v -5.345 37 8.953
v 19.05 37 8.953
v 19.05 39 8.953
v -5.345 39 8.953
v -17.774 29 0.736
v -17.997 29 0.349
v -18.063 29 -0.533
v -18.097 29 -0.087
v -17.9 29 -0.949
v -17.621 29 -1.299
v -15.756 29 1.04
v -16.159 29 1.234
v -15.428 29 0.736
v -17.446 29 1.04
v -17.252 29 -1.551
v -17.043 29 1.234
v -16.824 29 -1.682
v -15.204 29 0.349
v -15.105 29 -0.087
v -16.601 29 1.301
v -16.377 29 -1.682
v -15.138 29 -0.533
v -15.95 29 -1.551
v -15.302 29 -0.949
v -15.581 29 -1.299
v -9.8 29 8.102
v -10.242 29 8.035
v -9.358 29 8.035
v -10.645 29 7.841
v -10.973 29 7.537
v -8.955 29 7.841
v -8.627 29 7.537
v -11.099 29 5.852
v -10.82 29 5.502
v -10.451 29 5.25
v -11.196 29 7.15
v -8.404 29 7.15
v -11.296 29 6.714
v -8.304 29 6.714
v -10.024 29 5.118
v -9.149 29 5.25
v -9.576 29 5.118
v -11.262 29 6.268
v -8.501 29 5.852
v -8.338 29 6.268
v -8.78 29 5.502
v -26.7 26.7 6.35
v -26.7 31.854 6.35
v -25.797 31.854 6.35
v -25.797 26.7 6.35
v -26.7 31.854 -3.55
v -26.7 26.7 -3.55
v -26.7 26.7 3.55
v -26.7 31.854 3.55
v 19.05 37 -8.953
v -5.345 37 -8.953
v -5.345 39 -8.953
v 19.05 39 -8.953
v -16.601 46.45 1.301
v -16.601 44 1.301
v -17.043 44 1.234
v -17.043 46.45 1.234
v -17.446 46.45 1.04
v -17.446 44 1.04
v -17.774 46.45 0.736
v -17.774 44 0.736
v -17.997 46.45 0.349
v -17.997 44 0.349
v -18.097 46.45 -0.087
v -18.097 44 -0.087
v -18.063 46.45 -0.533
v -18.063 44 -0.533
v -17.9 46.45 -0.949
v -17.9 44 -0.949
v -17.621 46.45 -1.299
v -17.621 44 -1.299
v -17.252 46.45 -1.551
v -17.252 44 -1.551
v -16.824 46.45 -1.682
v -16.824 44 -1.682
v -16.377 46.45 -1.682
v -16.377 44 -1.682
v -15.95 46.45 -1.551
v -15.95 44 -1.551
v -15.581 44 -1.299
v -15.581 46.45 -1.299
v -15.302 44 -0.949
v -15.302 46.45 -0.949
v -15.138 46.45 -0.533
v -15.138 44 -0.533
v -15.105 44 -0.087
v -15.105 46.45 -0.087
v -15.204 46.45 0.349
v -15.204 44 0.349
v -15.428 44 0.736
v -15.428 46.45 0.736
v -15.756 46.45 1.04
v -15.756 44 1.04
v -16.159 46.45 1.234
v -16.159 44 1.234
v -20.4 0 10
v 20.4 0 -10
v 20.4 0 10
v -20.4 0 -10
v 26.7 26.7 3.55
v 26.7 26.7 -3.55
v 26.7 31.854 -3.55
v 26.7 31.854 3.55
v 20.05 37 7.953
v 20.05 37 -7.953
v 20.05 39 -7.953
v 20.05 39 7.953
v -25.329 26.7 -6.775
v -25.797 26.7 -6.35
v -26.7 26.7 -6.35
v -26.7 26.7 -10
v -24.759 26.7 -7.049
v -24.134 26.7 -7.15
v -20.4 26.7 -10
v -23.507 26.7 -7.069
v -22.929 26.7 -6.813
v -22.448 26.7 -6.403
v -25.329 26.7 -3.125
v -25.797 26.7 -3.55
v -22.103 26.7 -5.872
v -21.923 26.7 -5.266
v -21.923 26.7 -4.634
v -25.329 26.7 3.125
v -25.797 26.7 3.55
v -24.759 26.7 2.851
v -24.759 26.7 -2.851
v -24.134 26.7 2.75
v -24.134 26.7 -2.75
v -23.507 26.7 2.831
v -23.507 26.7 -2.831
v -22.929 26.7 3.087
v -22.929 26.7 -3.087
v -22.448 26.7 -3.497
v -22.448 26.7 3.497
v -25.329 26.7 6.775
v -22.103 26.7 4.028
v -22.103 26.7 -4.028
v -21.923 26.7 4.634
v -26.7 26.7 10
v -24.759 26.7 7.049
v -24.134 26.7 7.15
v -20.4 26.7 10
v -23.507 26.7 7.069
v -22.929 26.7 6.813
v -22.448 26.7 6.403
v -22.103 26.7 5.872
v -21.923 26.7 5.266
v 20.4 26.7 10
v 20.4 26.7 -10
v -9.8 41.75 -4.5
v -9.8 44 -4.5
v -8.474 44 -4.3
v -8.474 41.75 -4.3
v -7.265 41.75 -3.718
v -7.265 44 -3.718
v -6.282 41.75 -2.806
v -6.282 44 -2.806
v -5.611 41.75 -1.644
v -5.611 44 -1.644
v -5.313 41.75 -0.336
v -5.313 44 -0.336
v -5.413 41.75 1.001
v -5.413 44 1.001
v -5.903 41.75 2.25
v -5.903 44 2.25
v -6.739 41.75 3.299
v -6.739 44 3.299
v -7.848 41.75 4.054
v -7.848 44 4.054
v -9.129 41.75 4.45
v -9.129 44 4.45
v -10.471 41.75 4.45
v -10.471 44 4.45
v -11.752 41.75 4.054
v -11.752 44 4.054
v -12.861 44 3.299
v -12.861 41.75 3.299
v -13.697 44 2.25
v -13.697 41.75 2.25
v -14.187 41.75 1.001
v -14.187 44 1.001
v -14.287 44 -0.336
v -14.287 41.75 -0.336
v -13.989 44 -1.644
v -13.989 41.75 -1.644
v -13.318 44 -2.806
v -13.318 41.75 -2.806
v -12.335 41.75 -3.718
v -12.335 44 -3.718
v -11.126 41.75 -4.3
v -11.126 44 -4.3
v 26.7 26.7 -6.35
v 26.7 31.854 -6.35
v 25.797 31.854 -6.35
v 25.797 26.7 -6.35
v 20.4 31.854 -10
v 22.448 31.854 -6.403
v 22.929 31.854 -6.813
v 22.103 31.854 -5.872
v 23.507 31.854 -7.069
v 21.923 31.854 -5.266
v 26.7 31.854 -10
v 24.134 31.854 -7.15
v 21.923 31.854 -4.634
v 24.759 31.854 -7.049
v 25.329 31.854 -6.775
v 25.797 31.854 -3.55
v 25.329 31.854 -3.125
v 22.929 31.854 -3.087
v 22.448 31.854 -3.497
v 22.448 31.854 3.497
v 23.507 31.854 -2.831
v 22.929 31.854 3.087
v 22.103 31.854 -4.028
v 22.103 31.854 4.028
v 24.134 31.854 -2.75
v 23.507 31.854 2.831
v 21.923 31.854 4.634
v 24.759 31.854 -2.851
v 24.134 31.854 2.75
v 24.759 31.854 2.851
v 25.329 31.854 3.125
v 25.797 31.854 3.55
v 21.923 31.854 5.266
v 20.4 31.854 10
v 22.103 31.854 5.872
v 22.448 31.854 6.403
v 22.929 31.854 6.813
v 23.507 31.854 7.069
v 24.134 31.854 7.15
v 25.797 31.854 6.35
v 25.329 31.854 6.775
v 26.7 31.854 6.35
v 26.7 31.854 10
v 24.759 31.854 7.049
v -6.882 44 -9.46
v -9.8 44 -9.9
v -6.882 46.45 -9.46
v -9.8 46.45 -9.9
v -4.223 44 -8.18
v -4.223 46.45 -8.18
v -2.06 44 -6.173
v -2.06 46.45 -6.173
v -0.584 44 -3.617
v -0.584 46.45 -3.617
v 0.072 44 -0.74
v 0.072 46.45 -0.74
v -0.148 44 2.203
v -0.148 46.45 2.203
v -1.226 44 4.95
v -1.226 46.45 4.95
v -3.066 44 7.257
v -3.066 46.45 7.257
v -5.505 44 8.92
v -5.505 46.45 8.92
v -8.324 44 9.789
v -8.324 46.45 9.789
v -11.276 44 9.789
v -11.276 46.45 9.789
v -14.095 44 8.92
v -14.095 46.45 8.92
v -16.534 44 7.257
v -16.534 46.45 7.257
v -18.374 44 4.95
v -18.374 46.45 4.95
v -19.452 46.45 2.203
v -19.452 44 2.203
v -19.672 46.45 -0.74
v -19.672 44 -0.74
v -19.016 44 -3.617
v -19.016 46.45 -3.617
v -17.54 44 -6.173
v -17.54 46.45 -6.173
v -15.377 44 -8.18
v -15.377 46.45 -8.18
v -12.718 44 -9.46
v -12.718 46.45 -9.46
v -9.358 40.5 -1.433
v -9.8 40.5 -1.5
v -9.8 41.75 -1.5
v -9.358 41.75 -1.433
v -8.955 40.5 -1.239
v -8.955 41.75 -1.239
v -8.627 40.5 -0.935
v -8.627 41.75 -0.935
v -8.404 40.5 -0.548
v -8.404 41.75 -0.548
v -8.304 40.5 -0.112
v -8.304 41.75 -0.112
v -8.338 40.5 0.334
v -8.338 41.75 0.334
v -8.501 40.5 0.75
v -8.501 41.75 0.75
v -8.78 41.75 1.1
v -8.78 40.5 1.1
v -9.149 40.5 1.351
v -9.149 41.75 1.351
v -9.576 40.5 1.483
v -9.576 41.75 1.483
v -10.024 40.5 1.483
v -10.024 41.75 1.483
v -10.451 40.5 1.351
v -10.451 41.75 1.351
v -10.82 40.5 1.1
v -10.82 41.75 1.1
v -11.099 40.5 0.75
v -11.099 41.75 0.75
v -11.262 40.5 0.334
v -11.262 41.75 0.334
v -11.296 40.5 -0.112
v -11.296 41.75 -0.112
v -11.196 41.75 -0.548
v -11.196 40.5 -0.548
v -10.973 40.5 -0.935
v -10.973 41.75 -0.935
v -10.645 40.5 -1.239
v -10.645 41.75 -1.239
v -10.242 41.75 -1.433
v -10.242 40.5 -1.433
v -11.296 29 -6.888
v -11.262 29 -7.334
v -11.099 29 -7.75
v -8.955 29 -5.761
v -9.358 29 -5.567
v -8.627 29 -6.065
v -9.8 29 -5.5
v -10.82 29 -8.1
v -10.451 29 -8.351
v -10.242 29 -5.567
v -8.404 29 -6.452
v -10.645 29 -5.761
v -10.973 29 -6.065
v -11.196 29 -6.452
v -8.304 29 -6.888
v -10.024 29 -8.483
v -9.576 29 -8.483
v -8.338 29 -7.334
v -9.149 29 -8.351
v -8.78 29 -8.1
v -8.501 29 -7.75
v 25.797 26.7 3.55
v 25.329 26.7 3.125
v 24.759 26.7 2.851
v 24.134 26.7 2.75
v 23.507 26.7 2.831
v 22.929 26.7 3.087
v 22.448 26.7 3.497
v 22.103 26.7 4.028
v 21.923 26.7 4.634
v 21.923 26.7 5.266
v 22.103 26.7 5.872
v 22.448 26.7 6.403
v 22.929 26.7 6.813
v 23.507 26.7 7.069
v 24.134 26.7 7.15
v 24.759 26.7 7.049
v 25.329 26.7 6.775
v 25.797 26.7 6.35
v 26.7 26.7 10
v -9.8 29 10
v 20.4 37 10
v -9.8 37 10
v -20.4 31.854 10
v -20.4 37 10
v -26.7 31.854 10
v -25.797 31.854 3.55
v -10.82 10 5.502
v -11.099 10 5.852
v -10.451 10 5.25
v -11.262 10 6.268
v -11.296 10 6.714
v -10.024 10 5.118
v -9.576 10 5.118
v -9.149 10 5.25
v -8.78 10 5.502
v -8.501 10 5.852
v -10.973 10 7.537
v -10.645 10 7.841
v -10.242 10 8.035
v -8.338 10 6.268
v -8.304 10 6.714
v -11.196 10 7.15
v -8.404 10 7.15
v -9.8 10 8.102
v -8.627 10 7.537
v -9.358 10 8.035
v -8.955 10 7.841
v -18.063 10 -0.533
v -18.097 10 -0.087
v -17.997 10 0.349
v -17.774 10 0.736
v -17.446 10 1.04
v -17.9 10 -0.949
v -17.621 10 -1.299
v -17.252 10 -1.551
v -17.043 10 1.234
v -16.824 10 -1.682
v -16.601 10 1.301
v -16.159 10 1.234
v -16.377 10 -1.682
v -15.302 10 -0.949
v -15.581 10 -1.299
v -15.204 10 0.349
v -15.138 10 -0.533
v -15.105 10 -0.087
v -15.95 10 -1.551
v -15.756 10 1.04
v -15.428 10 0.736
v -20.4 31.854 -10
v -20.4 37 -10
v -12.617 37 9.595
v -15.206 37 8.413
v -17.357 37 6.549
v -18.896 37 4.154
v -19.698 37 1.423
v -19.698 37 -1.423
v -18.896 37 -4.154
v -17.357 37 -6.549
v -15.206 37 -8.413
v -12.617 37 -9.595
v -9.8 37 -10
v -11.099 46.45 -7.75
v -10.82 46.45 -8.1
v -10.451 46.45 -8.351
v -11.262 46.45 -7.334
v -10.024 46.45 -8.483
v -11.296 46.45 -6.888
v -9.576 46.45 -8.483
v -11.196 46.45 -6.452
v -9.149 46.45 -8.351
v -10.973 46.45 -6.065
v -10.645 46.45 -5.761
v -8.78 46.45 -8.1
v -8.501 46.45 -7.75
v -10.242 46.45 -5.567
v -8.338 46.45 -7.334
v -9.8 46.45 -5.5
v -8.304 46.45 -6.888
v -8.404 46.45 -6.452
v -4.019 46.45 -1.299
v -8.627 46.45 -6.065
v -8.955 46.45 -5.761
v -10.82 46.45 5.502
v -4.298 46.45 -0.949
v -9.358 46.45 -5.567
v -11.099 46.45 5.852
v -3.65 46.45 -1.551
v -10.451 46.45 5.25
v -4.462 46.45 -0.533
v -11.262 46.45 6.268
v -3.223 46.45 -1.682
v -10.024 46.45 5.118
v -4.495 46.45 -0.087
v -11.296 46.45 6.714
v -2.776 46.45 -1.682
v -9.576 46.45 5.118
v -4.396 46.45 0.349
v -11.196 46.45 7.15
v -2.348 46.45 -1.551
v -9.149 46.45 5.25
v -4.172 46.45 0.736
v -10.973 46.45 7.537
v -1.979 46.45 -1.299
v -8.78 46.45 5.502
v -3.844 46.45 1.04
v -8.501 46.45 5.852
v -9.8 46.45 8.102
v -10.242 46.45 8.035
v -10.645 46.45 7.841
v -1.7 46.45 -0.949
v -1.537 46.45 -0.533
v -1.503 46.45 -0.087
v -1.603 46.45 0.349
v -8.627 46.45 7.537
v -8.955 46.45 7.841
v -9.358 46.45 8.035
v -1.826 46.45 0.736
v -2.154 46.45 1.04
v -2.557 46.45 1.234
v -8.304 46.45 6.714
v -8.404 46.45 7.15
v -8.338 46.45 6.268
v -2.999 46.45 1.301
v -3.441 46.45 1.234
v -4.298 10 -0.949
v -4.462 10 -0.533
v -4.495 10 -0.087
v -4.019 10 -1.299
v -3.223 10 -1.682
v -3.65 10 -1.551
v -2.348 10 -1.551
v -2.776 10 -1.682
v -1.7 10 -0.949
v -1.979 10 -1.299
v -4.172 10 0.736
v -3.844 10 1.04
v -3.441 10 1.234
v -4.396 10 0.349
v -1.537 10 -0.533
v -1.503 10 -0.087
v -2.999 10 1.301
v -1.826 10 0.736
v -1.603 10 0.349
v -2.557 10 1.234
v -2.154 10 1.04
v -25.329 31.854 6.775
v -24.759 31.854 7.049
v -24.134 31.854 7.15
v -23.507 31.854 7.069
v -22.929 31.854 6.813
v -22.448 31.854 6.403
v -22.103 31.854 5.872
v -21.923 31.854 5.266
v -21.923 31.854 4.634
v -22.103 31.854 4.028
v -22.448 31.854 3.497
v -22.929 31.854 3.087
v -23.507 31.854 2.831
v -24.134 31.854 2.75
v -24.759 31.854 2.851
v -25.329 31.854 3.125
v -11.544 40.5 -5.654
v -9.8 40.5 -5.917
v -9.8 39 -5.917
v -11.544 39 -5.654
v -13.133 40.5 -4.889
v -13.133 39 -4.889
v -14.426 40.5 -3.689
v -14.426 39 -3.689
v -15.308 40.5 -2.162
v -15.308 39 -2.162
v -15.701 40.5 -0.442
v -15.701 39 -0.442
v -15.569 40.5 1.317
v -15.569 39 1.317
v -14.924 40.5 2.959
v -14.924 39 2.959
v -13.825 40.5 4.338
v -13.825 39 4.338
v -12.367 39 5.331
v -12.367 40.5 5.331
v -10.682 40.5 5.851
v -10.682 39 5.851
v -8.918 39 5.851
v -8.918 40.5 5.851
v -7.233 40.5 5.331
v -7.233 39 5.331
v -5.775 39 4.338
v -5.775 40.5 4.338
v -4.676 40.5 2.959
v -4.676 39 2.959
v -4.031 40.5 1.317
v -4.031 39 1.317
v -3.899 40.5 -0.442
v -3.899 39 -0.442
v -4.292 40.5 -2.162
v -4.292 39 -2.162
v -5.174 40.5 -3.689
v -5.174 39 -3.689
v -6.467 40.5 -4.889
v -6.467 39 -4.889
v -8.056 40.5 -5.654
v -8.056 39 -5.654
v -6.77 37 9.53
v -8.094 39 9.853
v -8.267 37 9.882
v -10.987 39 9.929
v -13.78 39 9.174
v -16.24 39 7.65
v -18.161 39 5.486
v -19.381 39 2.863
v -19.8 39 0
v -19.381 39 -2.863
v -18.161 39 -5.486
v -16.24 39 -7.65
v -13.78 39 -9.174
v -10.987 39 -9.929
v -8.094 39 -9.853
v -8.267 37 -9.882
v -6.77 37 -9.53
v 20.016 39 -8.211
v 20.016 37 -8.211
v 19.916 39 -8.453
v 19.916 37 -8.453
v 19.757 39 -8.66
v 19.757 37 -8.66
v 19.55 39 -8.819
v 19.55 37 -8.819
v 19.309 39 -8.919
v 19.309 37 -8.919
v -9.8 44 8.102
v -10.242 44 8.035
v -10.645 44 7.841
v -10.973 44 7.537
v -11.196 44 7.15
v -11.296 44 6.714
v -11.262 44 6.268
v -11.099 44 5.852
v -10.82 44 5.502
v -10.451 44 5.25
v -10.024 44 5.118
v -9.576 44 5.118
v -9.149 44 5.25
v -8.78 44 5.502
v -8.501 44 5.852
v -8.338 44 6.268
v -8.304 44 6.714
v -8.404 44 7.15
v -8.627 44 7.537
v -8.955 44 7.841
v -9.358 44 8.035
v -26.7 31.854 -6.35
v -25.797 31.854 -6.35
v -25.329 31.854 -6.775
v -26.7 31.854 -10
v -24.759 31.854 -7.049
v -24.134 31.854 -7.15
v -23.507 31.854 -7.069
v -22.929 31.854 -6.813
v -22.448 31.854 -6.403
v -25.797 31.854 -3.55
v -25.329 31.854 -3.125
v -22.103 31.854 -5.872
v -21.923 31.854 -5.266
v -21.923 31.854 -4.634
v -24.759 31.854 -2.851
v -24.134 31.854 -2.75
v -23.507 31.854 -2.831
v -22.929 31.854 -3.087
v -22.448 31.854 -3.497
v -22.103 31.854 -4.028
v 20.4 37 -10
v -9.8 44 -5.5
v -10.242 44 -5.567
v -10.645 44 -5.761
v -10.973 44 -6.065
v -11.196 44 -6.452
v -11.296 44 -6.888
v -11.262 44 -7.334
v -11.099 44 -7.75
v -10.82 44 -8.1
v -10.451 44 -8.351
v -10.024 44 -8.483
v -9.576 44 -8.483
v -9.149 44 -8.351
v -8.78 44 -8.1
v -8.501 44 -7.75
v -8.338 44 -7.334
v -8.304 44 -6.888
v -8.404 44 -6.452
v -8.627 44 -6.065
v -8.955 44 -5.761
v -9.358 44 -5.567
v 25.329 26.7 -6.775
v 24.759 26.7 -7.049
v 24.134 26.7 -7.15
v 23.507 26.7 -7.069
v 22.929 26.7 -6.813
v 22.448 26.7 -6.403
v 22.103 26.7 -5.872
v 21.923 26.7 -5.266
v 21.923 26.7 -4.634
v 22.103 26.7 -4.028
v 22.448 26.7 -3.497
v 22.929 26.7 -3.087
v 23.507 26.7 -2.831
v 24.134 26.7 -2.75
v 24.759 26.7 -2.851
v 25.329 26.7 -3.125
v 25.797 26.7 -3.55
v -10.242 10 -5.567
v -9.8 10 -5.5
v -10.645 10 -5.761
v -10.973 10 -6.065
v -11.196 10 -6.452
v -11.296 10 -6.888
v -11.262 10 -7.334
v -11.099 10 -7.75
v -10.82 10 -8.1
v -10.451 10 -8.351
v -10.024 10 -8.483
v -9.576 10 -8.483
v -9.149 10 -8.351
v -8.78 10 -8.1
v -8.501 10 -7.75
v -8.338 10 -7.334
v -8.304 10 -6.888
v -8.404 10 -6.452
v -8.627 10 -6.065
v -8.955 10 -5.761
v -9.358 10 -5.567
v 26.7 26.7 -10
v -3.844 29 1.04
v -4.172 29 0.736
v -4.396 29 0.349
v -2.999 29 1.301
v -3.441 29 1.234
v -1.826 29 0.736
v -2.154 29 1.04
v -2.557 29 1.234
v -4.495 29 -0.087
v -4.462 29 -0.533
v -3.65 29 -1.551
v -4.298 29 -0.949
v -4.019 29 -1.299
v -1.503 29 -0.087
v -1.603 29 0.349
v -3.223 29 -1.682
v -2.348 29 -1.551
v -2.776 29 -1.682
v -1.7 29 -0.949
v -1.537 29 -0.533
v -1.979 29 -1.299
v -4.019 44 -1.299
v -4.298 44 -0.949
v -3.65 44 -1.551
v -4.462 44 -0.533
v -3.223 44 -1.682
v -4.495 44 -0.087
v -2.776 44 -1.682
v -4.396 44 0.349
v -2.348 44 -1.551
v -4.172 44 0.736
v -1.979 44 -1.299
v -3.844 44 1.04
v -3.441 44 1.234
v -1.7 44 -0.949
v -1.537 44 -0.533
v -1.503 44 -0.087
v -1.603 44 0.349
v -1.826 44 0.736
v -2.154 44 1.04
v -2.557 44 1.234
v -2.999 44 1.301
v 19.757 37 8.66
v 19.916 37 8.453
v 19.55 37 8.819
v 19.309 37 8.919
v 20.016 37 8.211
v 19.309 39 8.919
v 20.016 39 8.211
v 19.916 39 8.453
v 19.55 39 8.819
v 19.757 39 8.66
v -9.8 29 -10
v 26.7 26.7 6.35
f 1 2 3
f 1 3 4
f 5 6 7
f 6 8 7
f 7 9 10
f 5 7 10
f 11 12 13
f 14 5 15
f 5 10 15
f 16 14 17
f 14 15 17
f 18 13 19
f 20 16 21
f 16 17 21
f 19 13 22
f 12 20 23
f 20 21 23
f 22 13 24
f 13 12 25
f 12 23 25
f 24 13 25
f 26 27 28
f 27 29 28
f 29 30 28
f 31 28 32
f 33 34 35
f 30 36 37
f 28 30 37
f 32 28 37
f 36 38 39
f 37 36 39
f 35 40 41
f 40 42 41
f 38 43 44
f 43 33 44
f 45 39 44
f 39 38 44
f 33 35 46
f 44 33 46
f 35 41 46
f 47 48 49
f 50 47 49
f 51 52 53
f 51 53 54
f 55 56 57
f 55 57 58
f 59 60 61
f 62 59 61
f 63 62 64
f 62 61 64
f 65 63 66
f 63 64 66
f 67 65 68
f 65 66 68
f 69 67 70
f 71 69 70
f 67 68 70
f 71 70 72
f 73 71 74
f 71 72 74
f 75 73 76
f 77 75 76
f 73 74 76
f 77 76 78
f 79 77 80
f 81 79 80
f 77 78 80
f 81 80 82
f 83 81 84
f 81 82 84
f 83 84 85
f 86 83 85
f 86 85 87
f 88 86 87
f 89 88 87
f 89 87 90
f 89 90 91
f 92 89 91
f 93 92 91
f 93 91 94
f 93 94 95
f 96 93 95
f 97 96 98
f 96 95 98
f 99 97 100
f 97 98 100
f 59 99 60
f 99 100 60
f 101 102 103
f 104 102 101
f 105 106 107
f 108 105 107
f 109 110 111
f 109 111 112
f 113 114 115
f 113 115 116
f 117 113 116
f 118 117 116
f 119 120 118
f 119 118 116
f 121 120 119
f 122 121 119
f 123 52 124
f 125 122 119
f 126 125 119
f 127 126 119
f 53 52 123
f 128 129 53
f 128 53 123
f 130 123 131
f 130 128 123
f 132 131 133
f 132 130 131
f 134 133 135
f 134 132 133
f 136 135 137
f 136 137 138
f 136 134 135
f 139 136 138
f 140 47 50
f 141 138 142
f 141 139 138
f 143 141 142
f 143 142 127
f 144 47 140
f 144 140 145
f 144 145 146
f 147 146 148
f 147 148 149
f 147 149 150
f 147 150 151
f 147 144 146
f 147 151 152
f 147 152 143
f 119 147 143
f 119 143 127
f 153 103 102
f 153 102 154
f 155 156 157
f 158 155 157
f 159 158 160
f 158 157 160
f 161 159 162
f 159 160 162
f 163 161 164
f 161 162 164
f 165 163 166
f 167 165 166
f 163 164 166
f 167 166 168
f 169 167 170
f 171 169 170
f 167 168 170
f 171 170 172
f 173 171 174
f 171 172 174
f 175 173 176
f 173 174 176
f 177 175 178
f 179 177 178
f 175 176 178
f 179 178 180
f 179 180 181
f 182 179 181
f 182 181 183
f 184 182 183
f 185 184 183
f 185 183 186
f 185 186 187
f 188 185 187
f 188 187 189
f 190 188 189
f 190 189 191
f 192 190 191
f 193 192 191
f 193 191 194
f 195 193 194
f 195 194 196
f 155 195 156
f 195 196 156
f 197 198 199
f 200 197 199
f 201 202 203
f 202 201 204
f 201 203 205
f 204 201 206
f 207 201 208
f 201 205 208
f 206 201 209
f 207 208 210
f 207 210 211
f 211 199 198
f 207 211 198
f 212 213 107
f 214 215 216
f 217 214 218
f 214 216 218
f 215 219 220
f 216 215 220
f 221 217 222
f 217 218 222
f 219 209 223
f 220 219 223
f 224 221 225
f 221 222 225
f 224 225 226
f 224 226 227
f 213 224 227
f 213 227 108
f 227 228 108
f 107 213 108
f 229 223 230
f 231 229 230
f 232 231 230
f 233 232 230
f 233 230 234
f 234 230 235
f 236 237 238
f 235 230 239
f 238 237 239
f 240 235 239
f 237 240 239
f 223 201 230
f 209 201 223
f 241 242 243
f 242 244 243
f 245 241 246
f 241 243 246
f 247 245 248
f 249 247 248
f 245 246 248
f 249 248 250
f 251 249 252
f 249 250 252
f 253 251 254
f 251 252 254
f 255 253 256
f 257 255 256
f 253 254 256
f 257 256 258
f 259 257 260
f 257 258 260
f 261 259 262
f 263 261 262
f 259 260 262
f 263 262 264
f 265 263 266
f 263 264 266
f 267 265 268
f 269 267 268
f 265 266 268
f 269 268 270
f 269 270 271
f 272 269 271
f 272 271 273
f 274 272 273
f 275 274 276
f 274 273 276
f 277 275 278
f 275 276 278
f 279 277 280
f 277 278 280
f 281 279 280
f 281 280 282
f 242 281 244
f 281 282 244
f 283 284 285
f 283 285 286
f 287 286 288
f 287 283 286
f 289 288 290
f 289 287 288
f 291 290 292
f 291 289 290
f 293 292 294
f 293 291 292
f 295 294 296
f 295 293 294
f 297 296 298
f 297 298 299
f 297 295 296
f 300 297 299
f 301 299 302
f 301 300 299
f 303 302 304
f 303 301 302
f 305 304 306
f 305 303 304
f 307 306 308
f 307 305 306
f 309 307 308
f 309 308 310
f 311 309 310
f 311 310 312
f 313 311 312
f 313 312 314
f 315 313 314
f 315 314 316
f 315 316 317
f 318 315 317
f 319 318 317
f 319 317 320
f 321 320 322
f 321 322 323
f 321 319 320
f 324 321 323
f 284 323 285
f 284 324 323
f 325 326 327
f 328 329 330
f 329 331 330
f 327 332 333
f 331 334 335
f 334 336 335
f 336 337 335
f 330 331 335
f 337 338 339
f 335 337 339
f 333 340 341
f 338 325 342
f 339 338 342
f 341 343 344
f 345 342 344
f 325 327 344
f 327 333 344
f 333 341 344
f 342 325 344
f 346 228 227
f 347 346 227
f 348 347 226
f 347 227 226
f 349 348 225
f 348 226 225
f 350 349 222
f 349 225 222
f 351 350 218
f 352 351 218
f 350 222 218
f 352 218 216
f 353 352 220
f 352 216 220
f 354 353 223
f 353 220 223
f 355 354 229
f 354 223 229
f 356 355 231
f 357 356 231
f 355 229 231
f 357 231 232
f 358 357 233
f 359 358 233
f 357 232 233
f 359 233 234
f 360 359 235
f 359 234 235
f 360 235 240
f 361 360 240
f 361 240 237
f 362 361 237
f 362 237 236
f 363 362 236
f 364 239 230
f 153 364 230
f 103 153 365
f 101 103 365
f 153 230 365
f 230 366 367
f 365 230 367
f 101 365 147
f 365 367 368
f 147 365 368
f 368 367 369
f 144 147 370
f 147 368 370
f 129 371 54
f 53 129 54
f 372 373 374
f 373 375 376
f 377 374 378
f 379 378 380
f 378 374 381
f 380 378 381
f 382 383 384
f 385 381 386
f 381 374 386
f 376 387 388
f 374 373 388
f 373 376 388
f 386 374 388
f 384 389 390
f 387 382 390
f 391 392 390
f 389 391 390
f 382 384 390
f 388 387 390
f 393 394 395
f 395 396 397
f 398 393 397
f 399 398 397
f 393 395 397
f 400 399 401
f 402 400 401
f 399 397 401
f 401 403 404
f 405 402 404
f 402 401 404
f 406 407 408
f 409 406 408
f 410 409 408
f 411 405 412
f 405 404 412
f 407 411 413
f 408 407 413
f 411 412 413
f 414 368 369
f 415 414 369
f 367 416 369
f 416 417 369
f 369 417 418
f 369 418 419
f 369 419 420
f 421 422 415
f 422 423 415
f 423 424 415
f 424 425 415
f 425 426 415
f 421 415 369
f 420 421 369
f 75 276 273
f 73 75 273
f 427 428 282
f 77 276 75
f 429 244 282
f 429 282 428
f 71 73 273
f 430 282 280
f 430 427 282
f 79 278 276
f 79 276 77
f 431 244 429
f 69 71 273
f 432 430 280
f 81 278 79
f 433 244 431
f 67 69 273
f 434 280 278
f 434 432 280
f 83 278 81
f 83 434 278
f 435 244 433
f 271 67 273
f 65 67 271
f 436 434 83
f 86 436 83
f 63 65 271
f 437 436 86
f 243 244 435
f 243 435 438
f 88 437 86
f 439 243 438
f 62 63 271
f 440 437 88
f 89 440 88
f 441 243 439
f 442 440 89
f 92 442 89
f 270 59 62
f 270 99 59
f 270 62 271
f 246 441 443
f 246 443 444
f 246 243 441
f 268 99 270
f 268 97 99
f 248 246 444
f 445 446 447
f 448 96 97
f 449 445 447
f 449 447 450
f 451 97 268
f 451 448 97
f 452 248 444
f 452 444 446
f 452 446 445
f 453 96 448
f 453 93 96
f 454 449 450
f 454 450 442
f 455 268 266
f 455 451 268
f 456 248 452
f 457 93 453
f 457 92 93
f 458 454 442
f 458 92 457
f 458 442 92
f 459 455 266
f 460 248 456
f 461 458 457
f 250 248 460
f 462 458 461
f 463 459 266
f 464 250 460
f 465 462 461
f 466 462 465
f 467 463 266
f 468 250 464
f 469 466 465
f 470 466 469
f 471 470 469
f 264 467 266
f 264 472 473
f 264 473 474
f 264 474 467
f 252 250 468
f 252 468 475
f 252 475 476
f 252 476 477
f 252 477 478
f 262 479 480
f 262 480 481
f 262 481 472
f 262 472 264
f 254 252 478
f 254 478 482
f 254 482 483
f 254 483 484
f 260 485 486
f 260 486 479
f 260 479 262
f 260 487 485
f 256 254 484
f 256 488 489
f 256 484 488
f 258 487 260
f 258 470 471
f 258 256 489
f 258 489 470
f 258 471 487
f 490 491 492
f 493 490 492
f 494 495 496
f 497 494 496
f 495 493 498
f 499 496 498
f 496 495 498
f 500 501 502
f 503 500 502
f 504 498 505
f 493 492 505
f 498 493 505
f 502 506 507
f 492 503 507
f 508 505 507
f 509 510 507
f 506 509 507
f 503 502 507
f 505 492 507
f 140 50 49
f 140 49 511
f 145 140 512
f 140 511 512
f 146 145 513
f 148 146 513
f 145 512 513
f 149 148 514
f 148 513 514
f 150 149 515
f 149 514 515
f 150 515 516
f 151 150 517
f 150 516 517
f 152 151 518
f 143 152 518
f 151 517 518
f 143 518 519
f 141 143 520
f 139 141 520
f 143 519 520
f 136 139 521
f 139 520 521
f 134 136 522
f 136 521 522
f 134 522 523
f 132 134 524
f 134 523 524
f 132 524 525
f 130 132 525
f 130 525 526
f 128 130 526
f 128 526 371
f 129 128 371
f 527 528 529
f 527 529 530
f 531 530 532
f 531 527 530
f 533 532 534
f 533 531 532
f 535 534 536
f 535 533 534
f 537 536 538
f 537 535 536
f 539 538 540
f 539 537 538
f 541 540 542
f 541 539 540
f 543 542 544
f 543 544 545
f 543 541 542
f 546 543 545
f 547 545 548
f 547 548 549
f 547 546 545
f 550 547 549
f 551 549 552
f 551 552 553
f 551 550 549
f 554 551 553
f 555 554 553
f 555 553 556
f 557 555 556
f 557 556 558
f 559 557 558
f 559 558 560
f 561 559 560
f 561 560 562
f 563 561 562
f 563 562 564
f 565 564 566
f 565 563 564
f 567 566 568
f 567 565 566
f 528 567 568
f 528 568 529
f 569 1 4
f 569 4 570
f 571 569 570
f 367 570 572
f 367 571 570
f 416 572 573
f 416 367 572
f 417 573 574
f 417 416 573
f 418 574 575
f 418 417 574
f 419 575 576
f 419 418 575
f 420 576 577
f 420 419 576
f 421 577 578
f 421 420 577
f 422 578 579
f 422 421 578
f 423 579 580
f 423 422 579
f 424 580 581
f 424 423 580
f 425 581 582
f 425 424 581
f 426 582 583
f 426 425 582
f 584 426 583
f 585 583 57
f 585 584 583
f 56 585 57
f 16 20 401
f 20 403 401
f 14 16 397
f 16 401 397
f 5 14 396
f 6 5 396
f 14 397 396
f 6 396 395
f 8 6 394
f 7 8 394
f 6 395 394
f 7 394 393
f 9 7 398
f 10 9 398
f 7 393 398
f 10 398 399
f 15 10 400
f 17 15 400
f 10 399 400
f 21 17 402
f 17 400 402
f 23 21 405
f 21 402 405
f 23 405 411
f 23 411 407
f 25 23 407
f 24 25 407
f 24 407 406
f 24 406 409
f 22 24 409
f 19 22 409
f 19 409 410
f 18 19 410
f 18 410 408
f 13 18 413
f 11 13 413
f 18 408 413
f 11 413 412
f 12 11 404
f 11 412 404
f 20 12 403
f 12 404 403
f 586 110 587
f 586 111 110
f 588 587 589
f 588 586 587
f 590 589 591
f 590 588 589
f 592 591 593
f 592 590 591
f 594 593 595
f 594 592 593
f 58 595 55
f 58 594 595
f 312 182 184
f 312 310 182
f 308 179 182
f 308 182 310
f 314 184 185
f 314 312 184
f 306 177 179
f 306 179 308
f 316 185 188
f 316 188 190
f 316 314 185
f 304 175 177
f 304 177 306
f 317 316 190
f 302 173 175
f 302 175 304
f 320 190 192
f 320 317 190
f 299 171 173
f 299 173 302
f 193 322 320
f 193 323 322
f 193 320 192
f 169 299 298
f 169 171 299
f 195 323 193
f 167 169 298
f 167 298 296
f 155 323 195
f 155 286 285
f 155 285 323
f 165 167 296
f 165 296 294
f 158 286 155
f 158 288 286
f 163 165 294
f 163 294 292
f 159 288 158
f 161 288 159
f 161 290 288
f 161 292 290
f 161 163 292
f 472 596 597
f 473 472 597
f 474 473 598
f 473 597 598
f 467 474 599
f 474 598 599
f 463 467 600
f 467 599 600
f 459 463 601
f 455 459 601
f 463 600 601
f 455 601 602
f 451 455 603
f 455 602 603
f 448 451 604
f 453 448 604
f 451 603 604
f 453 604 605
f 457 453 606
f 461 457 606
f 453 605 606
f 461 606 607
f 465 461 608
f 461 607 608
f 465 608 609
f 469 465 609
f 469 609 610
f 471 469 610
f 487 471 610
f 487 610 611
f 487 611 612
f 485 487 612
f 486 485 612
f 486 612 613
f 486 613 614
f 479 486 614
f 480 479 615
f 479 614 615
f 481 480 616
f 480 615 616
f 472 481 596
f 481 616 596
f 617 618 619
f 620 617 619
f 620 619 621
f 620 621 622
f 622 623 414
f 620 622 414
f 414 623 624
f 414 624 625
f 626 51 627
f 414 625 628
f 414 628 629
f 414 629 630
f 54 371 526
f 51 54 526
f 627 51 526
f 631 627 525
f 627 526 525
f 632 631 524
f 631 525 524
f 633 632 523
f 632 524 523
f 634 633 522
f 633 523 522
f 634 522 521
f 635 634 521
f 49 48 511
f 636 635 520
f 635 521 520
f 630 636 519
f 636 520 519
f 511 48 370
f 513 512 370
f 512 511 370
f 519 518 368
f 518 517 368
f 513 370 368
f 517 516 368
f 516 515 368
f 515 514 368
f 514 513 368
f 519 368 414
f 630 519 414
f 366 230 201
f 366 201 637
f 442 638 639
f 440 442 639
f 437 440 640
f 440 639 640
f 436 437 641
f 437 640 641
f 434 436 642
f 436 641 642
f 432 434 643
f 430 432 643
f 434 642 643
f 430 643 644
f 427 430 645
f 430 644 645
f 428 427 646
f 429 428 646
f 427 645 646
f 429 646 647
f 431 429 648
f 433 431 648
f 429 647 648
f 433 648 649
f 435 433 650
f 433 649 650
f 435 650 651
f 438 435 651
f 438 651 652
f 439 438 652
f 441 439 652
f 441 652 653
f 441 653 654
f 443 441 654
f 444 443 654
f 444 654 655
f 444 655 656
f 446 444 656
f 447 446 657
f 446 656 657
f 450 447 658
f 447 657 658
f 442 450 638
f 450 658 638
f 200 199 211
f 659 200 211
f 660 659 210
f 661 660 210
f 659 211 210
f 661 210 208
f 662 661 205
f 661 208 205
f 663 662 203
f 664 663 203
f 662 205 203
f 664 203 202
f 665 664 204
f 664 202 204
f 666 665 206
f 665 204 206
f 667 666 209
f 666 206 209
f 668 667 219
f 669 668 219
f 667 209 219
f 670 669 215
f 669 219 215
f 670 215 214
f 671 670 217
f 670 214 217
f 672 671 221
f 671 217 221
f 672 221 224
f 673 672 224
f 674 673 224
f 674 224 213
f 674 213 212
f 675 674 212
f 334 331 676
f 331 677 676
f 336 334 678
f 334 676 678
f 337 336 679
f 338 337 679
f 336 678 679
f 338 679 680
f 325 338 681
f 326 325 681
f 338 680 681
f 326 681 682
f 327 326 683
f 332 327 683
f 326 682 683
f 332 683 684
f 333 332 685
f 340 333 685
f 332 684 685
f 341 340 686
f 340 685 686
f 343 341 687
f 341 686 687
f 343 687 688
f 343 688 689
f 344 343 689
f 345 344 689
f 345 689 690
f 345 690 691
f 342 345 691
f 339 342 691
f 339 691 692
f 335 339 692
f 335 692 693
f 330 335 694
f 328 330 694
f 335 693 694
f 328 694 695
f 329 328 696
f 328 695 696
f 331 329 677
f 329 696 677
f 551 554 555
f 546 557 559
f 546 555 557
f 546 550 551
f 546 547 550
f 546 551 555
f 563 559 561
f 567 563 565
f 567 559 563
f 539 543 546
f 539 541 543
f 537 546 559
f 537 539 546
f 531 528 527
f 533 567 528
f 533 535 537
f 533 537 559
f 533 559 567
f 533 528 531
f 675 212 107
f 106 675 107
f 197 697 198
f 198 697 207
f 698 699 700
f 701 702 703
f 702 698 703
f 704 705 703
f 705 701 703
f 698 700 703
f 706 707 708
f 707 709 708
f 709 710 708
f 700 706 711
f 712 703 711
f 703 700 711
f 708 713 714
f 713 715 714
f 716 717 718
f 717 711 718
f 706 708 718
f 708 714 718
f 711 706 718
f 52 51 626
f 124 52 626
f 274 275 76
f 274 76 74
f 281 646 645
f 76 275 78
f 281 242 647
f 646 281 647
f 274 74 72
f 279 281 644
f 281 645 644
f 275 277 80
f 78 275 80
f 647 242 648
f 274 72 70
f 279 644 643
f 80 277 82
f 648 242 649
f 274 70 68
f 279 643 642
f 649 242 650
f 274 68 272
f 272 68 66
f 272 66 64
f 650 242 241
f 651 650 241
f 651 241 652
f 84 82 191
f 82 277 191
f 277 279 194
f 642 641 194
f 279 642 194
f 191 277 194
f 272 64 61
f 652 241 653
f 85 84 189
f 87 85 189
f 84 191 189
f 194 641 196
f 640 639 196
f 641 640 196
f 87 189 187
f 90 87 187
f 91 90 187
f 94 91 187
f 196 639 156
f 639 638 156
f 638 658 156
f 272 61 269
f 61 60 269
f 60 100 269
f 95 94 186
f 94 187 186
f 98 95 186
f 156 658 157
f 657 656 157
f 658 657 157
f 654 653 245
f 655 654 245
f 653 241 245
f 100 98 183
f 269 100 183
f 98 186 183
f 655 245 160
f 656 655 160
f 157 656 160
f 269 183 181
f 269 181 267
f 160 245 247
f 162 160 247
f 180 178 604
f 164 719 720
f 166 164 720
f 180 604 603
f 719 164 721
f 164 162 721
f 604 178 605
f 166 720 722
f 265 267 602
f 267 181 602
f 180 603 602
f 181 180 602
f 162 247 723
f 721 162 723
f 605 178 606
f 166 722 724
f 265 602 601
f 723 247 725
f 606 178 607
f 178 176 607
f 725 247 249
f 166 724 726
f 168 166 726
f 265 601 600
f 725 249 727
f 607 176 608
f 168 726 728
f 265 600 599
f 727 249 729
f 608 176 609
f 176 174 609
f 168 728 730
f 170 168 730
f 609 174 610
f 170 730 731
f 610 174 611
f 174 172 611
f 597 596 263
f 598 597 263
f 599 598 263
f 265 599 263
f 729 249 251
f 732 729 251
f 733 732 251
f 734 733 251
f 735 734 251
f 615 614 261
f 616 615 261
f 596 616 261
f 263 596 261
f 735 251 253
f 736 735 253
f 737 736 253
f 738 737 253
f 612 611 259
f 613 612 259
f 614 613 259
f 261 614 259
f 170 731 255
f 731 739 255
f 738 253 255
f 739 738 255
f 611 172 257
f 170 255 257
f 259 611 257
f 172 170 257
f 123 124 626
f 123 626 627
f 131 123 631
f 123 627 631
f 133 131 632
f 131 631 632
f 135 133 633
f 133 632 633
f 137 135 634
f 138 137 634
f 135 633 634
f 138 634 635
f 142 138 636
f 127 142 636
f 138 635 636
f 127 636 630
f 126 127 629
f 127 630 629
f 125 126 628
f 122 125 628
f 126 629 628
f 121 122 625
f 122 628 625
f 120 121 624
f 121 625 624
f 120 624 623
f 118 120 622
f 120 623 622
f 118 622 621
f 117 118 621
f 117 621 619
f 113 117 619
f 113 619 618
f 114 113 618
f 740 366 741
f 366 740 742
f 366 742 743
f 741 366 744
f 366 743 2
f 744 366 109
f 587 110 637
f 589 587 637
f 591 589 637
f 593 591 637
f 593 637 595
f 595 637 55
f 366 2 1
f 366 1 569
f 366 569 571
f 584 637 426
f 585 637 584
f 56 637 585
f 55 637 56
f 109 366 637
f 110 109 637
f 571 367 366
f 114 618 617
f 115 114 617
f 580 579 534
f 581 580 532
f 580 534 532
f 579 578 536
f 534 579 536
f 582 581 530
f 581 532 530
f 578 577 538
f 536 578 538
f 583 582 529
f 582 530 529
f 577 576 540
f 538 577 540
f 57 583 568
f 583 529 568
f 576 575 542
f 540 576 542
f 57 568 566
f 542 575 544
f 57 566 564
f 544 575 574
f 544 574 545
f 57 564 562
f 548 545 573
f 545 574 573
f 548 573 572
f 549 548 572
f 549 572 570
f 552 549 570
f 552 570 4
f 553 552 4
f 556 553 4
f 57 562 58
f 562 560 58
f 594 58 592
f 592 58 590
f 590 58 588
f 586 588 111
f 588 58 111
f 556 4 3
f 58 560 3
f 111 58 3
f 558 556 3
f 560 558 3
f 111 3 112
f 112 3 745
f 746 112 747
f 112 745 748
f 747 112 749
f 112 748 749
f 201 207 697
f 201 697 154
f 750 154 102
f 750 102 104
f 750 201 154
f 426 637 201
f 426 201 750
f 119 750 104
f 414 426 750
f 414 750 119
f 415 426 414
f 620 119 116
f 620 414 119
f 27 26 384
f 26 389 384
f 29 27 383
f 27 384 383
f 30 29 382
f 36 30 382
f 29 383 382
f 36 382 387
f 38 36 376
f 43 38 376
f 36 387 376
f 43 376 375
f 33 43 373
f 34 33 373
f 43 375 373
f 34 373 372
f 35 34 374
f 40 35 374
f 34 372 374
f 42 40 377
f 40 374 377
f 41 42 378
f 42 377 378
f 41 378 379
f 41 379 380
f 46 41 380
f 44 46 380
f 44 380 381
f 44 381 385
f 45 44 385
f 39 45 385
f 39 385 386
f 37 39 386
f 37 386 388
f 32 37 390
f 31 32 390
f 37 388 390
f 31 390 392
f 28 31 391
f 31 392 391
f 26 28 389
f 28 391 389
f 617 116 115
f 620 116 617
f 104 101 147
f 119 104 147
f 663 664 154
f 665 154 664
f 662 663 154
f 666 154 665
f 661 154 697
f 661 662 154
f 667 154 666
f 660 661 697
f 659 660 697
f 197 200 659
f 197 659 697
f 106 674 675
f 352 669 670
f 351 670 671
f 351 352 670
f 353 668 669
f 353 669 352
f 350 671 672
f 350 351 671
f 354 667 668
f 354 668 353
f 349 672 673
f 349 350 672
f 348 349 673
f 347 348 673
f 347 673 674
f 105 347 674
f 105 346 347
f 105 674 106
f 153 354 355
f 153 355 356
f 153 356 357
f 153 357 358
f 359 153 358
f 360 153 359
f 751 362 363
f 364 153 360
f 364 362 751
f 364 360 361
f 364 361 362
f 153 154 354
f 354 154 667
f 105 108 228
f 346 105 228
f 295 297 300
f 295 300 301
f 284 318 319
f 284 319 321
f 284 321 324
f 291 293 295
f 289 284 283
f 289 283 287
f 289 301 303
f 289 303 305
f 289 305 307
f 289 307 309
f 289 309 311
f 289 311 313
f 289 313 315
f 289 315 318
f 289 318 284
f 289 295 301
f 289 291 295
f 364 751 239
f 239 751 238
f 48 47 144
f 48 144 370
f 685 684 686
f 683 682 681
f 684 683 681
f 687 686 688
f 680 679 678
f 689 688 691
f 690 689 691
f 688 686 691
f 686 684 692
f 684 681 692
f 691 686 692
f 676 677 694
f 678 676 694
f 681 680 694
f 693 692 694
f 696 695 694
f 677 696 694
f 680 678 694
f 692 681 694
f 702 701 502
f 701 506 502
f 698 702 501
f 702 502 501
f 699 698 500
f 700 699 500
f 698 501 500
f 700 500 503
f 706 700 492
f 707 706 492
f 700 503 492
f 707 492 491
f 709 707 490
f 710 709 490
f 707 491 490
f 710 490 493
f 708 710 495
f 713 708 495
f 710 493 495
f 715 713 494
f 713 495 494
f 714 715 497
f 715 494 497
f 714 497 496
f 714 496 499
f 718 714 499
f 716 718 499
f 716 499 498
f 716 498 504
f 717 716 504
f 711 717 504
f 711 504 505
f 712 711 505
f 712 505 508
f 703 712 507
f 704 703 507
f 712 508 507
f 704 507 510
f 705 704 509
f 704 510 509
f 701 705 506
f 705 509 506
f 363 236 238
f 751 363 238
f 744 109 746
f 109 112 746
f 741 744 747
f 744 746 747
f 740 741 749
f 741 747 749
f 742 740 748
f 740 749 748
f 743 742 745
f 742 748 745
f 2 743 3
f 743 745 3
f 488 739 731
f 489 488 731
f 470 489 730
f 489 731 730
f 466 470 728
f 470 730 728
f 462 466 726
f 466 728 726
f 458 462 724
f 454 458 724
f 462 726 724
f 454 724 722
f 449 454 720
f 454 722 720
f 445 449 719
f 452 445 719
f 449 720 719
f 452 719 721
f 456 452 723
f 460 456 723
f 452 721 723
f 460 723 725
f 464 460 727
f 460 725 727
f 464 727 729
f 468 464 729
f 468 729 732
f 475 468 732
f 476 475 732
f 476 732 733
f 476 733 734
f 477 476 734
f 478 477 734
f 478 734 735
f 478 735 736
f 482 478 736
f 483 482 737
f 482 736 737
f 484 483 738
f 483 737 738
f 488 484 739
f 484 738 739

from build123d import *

# Parameters (mm, degrees)
SKETCH9_W                         = 53.4
SKETCH9_H                         = 37
BOSS_EXTRUDE3_DEPTH               = 20
BOSS_EXTRUDE4_DEPTH               = 2
SKETCH15_W                        = 6.3
SKETCH15_H                        = 26.7
CUT_EXTRUDE1_DEPTH                = 52.321438016
SKETCH16_W                        = 6.3
SKETCH16_H                        = 5.145561791
CUT_EXTRUDE2_DEPTH                = 52.321438016
SKETCH17_W                        = 6.3
SKETCH17_H                        = 5.145561791
CUT_EXTRUDE3_DEPTH                = 52.321438016
CUT_EXTRUDE4_DEPTH                = 43.750382848
CUT_EXTRUDE5_DEPTH                = 43.750382848
SKETCH30_W                        = 6.3
SKETCH30_H                        = 26.7
CUT_EXTRUDE6_DEPTH                = 52.321438016
CUT_EXTRUDE7_DEPTH                = 43.750382848
CUT_EXTRUDE8_DEPTH                = 43.750382848
SKETCH40_W                        = 5.917139292
SKETCH40_H                        = 1.5
SKETCH47_W                        = 2.2
SKETCH47_H                        = 5.154438209
SKETCH55_W                        = 2.2
SKETCH55_H                        = 5.154438209
SKETCH64_W                        = 2.2
SKETCH64_H                        = 5.154438209
SKETCH72_W                        = 2.2
SKETCH72_H                        = 5.154438209
F_3_0_3_DIAMETER_HOLE2_D          = 3
F_3_0_3_DIAMETER_HOLE2_DEPTH      = 1.5
FILLET1_R                         = 1
SKETCH76_W                        = 9.9
SKETCH76_H                        = 2.45
SKETCH85_R                        = 4.5
BOSS_EXTRUDE5_DEPTH               = 2.25
BOSS_EXTRUDE6_START               = 1.25
SKETCH86_R                        = 1.5
BOSS_EXTRUDE6_DEPTH               = 1.25
SKETCH87_W                        = 1.5
SKETCH87_H                        = 46.45
F_3_0_3_DIAMETER_HOLE3_AT_2_COUNT = 2
F_3_0_3_DIAMETER_HOLE3_AT_2_PITCH = 9.617734802
F_3_0_3_DIAMETER_HOLE3_AT_3_COUNT = 2
F_3_0_3_DIAMETER_HOLE3_AT_3_PITCH = 13.601530997
F_3_0_3_DIAMETER_HOLE3_AT_4_COUNT = 2
F_3_0_3_DIAMETER_HOLE3_AT_4_PITCH = 9.617734802
SKETCH89_W                        = 40.8
SKETCH89_H                        = 20
BOSS_EXTRUDE7_DEPTH               = 10
BOSS_EXTRUDE8_DEPTH               = 10
SKETCH91_R                        = 5.917139292
BOSS_EXTRUDE9_DEPTH               = 10


with BuildPart() as part:
    # Sketch9 → Boss-Extrude3 (new body)
    with BuildSketch(Plane(origin=(0, 0, -10), x_dir=(-1, 0, 0), z_dir=(0, 0, -1))):
        with Locations((0, 18.5)):
            Rectangle(SKETCH9_W, SKETCH9_H)
    extrude(amount=-BOSS_EXTRUDE3_DEPTH)

    # Sketch10 → Boss-Extrude4 (add)
    with BuildSketch(Plane(origin=(0, 37, 0), x_dir=(-1, 0, 0), z_dir=(0, 1, 0))):
        with BuildLine():
            Line((-20.05, -8.952596504), (-20.05, 8.952596504))
            Line((-20.05, 8.952596504), (5.344552118, 8.952596504))
            ThreePointArc((5.344552118, 8.952596504), (19.8, 0), (5.344552118, -8.952596504))
            Line((5.344552118, -8.952596504), (-20.05, -8.952596504))
        make_face()
    extrude(amount=BOSS_EXTRUDE4_DEPTH)

    # Sketch15 → Cut-Extrude1 (cut, through all)
    with BuildSketch(Plane.XY.offset(10)):
        with Locations((-23.55, 13.35)):
            Rectangle(SKETCH15_W, SKETCH15_H)
    extrude(amount=-CUT_EXTRUDE1_DEPTH, mode=Mode.SUBTRACT)

    # Sketch16 → Cut-Extrude2 (cut, through all)
    with BuildSketch(Plane.XY.offset(10)):
        with Locations((-23.55, 34.427219104)):
            Rectangle(SKETCH16_W, SKETCH16_H)
    extrude(amount=-CUT_EXTRUDE2_DEPTH, mode=Mode.SUBTRACT)

    # Sketch17 → Cut-Extrude3 (cut, through all)
    with BuildSketch(Plane.XY.offset(10)):
        with Locations((23.55, 34.427219104)):
            Rectangle(SKETCH17_W, SKETCH17_H)
    extrude(amount=-CUT_EXTRUDE3_DEPTH, mode=Mode.SUBTRACT)

    # Sketch23 → Cut-Extrude4 (cut, through all)
    with BuildSketch(Plane(origin=(0, 31.854438209, 0), x_dir=(1, 0, 0), z_dir=(0, 1, 0))):
        with BuildLine():
            Line((-26.7, -3.55), (-26.7, -6.35))
            Line((-26.7, -6.35), (-25.797056275, -6.35))
            ThreePointArc((-25.797056275, -6.35), (-26.3, -4.95), (-25.797056275, -3.55))
            Line((-25.797056275, -3.55), (-26.7, -3.55))
        make_face()
    extrude(amount=-CUT_EXTRUDE4_DEPTH, mode=Mode.SUBTRACT)

    # Sketch24 → Cut-Extrude5 (cut, through all)
    with BuildSketch(Plane(origin=(0, 31.854438209, 0), x_dir=(-1, 0, 0), z_dir=(0, 1, 0))):
        with BuildLine():
            Line((26.7, -3.55), (25.797056275, -3.55))
            ThreePointArc((25.797056275, -3.55), (26.3, -4.95), (25.797056275, -6.35))
            Line((25.797056275, -6.35), (26.7, -6.35))
            Line((26.7, -6.35), (26.7, -3.55))
        make_face()
    extrude(amount=-CUT_EXTRUDE5_DEPTH, mode=Mode.SUBTRACT)

    # Sketch30 → Cut-Extrude6 (cut, through all)
    with BuildSketch(Plane.XY.offset(10)):
        with Locations((23.55, 13.35)):
            Rectangle(SKETCH30_W, SKETCH30_H)
    extrude(amount=-CUT_EXTRUDE6_DEPTH, mode=Mode.SUBTRACT)

    # Sketch37 → Cut-Extrude7 (cut, through all)
    with BuildSketch(Plane(origin=(0, 31.854438209, 0), x_dir=(1, 0, 0), z_dir=(0, 1, 0))):
        with BuildLine():
            Line((26.7, 3.55), (26.7, 6.35))
            Line((26.7, 6.35), (25.797056275, 6.35))
            ThreePointArc((25.797056275, 6.35), (26.3, 4.95), (25.797056275, 3.55))
            Line((25.797056275, 3.55), (26.7, 3.55))
        make_face()
    extrude(amount=-CUT_EXTRUDE7_DEPTH, mode=Mode.SUBTRACT)

    # Sketch38 → Cut-Extrude8 (cut, through all)
    with BuildSketch(Plane(origin=(0, 31.854438209, 0), x_dir=(-1, 0, 0), z_dir=(0, 1, 0))):
        with BuildLine():
            Line((-26.7, 3.55), (-25.797056275, 3.55))
            ThreePointArc((-25.797056275, 3.55), (-26.3, 4.95), (-25.797056275, 6.35))
            Line((-25.797056275, 6.35), (-26.7, 6.35))
            Line((-26.7, 6.35), (-26.7, 3.55))
        make_face()
    extrude(amount=-CUT_EXTRUDE8_DEPTH, mode=Mode.SUBTRACT)

    # Sketch40 → Revolve2 (revolve)
    with BuildSketch(Plane.XY, mode=Mode.PRIVATE) as revolve2_sk:
        with Locations((-6.841430354, 39.75)):
            Rectangle(SKETCH40_W, SKETCH40_H)
    revolve(revolve2_sk.sketch.rotate(Axis((-9.8, 40.5, 0), (0, -1, 0)), 270), axis=Axis((-9.8, 40.5, 0), (0, -1, 0)))

    # Sketch47 → Cut-Revolve1 (revolve, cut)
    with BuildSketch(Plane(origin=(0, 0, -4.95), x_dir=(-1, 0, 0), z_dir=(0, 0, -1))):
        with Locations((23, 29.277219105)):
            Rectangle(SKETCH47_W, SKETCH47_H)
    revolve(axis=Axis((-24.1, 26.7, -4.95), (0, 1, 0)), mode=Mode.SUBTRACT)

    # Sketch55 → Cut-Revolve2 (revolve, cut)
    with BuildSketch(Plane(origin=(0, 0, 4.95), x_dir=(-1, 0, 0), z_dir=(0, 0, -1))):
        with Locations((-25.2, 29.277219105)):
            Rectangle(SKETCH55_W, SKETCH55_H)
    revolve(axis=Axis((24.1, 26.7, 4.95), (0, 1, 0)), mode=Mode.SUBTRACT)

    # Sketch64 → Cut-Revolve3 (revolve, cut)
    with BuildSketch(Plane(origin=(0, 0, 4.95), x_dir=(-1, 0, 0), z_dir=(0, 0, -1))):
        with Locations((23, 29.277219105)):
            Rectangle(SKETCH64_W, SKETCH64_H)
    revolve(axis=Axis((-24.1, 26.7, 4.95), (0, 1, 0)), mode=Mode.SUBTRACT)

    # Sketch72 → Cut-Revolve4 (revolve, cut)
    with BuildSketch(Plane(origin=(0, 0, -4.95), x_dir=(-1, 0, 0), z_dir=(0, 0, -1))):
        with Locations((-25.2, 29.277219105)):
            Rectangle(SKETCH72_W, SKETCH72_H)
    revolve(axis=Axis((24.1, 26.7, -4.95), (0, 1, 0)), mode=Mode.SUBTRACT)

    # Ø3.0 (3) Diameter Hole2
    with Locations(Plane(origin=(0, 40.5, 0), x_dir=(1, 0, 0), z_dir=(0, 1, 0))):
        with Locations((-9.8, 0)):
            Hole(F_3_0_3_DIAMETER_HOLE2_D / 2, depth=F_3_0_3_DIAMETER_HOLE2_DEPTH)

    # Fillet1
    fillet1_edges = [part.edges().sort_by_distance(p)[0] for p in [
        (20.05, 38, 8.952596504),
        (20.05, 38, -8.952596504),
    ]]
    fillet(fillet1_edges, radius=FILLET1_R)


with BuildPart() as body_2:
    # Sketch76 → Revolve3 (revolve)
    with BuildSketch(Plane.XY, mode=Mode.PRIVATE) as revolve3_sk:
        with Locations((-4.85, 45.225)):
            Rectangle(SKETCH76_W, SKETCH76_H)
    revolve(revolve3_sk.sketch.rotate(Axis((-9.8, 46.45, 0), (0, -1, 0)), 270), axis=Axis((-9.8, 46.45, 0), (0, -1, 0)))

    # Sketch85 → Boss-Extrude5 (add)
    with BuildSketch(Plane(origin=(0, 44, 0), x_dir=(-1, 0, 0), z_dir=(0, -1, 0))):
        with Locations(Location((9.8, 0, 0), (0, 0, 90))):
            Circle(SKETCH85_R)
    extrude(amount=BOSS_EXTRUDE5_DEPTH)

    # Sketch86 → Boss-Extrude6 (add)
    with BuildSketch(Plane.XZ.offset(-41.75).offset(BOSS_EXTRUDE6_START)):
        with Locations(Location((-9.8, 0, 0), (0, 0, 270))):
            Circle(SKETCH86_R)
    extrude(amount=-BOSS_EXTRUDE6_DEPTH)


with BuildPart() as f_3_0_3_diameter_hole3_tool:
    # Sketch87 → Ø3.0 (3) Diameter Hole3 (revolve)
    with BuildSketch(Plane(origin=(-2.999234502, 46.45, -0.199234502), x_dir=(0, 0, 1), z_dir=(1, 0, 0))):
        with Locations((0.75, 23.225)):
            Rectangle(SKETCH87_W, SKETCH87_H)
    f_3_0_3_diameter_hole3 = revolve(axis=Axis((-2.999234502, 52.8, -0.199234502), (0, -1, 0)))


with BuildPart() as part_1:
    add(part.part)

    # Ø3.0 (3) Diameter Hole3: cut by f_3_0_3_diameter_hole3_tool
    add(f_3_0_3_diameter_hole3_tool.part, mode=Mode.SUBTRACT)


with BuildPart() as body_2_1:
    add(body_2.part)

    # Ø3.0 (3) Diameter Hole3: cut by f_3_0_3_diameter_hole3_tool
    add(f_3_0_3_diameter_hole3_tool.part, mode=Mode.SUBTRACT)


with BuildPart() as f_3_0_3_diameter_hole3_at_2_tool:
    # Ø3.0 (3) Diameter Hole3 at 2: Ø3.0 (3) Diameter Hole3 ×2
    with Locations(*[Vector(-0.7071067811865412, 0, 0.7071067811865539) * (i * F_3_0_3_DIAMETER_HOLE3_AT_2_PITCH) for i in range(1, F_3_0_3_DIAMETER_HOLE3_AT_2_COUNT)]):
        add(f_3_0_3_diameter_hole3)


with BuildPart() as part_2:
    add(part_1.part)

    # Ø3.0 (3) Diameter Hole3 at 2: cut by f_3_0_3_diameter_hole3_at_2_tool
    add(f_3_0_3_diameter_hole3_at_2_tool.part, mode=Mode.SUBTRACT)


with BuildPart() as body_2_2:
    add(body_2_1.part)

    # Ø3.0 (3) Diameter Hole3 at 2: cut by f_3_0_3_diameter_hole3_at_2_tool
    add(f_3_0_3_diameter_hole3_at_2_tool.part, mode=Mode.SUBTRACT)


with BuildPart() as f_3_0_3_diameter_hole3_at_3_tool:
    # Ø3.0 (3) Diameter Hole3 at 3: Ø3.0 (3) Diameter Hole3 ×2
    with Locations(*[(-i * F_3_0_3_DIAMETER_HOLE3_AT_3_PITCH, 0, 0) for i in range(1, F_3_0_3_DIAMETER_HOLE3_AT_3_COUNT)]):
        add(f_3_0_3_diameter_hole3)


with BuildPart() as part_3:
    add(part_2.part)

    # Ø3.0 (3) Diameter Hole3 at 3: cut by f_3_0_3_diameter_hole3_at_3_tool
    add(f_3_0_3_diameter_hole3_at_3_tool.part, mode=Mode.SUBTRACT)


with BuildPart() as body_2_3:
    add(body_2_2.part)

    # Ø3.0 (3) Diameter Hole3 at 3: cut by f_3_0_3_diameter_hole3_at_3_tool
    add(f_3_0_3_diameter_hole3_at_3_tool.part, mode=Mode.SUBTRACT)


with BuildPart() as f_3_0_3_diameter_hole3_at_4_tool:
    # Ø3.0 (3) Diameter Hole3 at 4: Ø3.0 (3) Diameter Hole3 ×2
    with Locations(*[Vector(-0.707106781186556, 0, -0.7071067811865391) * (i * F_3_0_3_DIAMETER_HOLE3_AT_4_PITCH) for i in range(1, F_3_0_3_DIAMETER_HOLE3_AT_4_COUNT)]):
        add(f_3_0_3_diameter_hole3)


with BuildPart() as part_4:
    add(part_3.part)

    # Ø3.0 (3) Diameter Hole3 at 4: cut by f_3_0_3_diameter_hole3_at_4_tool
    add(f_3_0_3_diameter_hole3_at_4_tool.part, mode=Mode.SUBTRACT)

    # Sketch89 → Boss-Extrude7 (add)
    with BuildSketch(Plane.XZ):
        Rectangle(SKETCH89_W, SKETCH89_H)
    extrude(amount=-BOSS_EXTRUDE7_DEPTH)

    # Sketch90 → Boss-Extrude8 (add)
    with BuildSketch(Plane(origin=(0, 39, 0), x_dir=(1, 0, 0), z_dir=(0, 1, 0))):
        with BuildLine():
            Line((20.05, -7.952596504), (20.05, 7.952596504))
            ThreePointArc((20.05, 7.952596504), (19.757106781, 8.659703286), (19.05, 8.952596504))
            Line((19.05, 8.952596504), (-5.344552118, 8.952596504))
            ThreePointArc((-5.344552118, 8.952596504), (-19.8, 0), (-5.344552118, -8.952596504))
            Line((-5.344552118, -8.952596504), (19.05, -8.952596504))
            ThreePointArc((19.05, -8.952596504), (19.757106781, -8.659703286), (20.05, -7.952596504))
        make_face()
    extrude(amount=-BOSS_EXTRUDE8_DEPTH)

    # Sketch91 → Boss-Extrude9 (add)
    with BuildSketch(Plane(origin=(0, 40.5, 0), x_dir=(1, 0, 0), z_dir=(0, 1, 0))):
        with Locations(Location((-9.8, 0, 0), (0, 0, 90))):
            Circle(SKETCH91_R)
    extrude(amount=-BOSS_EXTRUDE9_DEPTH)


with BuildPart() as body_2_4:
    add(body_2_3.part)

    # Ø3.0 (3) Diameter Hole3 at 4: cut by f_3_0_3_diameter_hole3_at_4_tool
    add(f_3_0_3_diameter_hole3_at_4_tool.part, mode=Mode.SUBTRACT)


solid = Compound([part_4.part, body_2_4.part])
